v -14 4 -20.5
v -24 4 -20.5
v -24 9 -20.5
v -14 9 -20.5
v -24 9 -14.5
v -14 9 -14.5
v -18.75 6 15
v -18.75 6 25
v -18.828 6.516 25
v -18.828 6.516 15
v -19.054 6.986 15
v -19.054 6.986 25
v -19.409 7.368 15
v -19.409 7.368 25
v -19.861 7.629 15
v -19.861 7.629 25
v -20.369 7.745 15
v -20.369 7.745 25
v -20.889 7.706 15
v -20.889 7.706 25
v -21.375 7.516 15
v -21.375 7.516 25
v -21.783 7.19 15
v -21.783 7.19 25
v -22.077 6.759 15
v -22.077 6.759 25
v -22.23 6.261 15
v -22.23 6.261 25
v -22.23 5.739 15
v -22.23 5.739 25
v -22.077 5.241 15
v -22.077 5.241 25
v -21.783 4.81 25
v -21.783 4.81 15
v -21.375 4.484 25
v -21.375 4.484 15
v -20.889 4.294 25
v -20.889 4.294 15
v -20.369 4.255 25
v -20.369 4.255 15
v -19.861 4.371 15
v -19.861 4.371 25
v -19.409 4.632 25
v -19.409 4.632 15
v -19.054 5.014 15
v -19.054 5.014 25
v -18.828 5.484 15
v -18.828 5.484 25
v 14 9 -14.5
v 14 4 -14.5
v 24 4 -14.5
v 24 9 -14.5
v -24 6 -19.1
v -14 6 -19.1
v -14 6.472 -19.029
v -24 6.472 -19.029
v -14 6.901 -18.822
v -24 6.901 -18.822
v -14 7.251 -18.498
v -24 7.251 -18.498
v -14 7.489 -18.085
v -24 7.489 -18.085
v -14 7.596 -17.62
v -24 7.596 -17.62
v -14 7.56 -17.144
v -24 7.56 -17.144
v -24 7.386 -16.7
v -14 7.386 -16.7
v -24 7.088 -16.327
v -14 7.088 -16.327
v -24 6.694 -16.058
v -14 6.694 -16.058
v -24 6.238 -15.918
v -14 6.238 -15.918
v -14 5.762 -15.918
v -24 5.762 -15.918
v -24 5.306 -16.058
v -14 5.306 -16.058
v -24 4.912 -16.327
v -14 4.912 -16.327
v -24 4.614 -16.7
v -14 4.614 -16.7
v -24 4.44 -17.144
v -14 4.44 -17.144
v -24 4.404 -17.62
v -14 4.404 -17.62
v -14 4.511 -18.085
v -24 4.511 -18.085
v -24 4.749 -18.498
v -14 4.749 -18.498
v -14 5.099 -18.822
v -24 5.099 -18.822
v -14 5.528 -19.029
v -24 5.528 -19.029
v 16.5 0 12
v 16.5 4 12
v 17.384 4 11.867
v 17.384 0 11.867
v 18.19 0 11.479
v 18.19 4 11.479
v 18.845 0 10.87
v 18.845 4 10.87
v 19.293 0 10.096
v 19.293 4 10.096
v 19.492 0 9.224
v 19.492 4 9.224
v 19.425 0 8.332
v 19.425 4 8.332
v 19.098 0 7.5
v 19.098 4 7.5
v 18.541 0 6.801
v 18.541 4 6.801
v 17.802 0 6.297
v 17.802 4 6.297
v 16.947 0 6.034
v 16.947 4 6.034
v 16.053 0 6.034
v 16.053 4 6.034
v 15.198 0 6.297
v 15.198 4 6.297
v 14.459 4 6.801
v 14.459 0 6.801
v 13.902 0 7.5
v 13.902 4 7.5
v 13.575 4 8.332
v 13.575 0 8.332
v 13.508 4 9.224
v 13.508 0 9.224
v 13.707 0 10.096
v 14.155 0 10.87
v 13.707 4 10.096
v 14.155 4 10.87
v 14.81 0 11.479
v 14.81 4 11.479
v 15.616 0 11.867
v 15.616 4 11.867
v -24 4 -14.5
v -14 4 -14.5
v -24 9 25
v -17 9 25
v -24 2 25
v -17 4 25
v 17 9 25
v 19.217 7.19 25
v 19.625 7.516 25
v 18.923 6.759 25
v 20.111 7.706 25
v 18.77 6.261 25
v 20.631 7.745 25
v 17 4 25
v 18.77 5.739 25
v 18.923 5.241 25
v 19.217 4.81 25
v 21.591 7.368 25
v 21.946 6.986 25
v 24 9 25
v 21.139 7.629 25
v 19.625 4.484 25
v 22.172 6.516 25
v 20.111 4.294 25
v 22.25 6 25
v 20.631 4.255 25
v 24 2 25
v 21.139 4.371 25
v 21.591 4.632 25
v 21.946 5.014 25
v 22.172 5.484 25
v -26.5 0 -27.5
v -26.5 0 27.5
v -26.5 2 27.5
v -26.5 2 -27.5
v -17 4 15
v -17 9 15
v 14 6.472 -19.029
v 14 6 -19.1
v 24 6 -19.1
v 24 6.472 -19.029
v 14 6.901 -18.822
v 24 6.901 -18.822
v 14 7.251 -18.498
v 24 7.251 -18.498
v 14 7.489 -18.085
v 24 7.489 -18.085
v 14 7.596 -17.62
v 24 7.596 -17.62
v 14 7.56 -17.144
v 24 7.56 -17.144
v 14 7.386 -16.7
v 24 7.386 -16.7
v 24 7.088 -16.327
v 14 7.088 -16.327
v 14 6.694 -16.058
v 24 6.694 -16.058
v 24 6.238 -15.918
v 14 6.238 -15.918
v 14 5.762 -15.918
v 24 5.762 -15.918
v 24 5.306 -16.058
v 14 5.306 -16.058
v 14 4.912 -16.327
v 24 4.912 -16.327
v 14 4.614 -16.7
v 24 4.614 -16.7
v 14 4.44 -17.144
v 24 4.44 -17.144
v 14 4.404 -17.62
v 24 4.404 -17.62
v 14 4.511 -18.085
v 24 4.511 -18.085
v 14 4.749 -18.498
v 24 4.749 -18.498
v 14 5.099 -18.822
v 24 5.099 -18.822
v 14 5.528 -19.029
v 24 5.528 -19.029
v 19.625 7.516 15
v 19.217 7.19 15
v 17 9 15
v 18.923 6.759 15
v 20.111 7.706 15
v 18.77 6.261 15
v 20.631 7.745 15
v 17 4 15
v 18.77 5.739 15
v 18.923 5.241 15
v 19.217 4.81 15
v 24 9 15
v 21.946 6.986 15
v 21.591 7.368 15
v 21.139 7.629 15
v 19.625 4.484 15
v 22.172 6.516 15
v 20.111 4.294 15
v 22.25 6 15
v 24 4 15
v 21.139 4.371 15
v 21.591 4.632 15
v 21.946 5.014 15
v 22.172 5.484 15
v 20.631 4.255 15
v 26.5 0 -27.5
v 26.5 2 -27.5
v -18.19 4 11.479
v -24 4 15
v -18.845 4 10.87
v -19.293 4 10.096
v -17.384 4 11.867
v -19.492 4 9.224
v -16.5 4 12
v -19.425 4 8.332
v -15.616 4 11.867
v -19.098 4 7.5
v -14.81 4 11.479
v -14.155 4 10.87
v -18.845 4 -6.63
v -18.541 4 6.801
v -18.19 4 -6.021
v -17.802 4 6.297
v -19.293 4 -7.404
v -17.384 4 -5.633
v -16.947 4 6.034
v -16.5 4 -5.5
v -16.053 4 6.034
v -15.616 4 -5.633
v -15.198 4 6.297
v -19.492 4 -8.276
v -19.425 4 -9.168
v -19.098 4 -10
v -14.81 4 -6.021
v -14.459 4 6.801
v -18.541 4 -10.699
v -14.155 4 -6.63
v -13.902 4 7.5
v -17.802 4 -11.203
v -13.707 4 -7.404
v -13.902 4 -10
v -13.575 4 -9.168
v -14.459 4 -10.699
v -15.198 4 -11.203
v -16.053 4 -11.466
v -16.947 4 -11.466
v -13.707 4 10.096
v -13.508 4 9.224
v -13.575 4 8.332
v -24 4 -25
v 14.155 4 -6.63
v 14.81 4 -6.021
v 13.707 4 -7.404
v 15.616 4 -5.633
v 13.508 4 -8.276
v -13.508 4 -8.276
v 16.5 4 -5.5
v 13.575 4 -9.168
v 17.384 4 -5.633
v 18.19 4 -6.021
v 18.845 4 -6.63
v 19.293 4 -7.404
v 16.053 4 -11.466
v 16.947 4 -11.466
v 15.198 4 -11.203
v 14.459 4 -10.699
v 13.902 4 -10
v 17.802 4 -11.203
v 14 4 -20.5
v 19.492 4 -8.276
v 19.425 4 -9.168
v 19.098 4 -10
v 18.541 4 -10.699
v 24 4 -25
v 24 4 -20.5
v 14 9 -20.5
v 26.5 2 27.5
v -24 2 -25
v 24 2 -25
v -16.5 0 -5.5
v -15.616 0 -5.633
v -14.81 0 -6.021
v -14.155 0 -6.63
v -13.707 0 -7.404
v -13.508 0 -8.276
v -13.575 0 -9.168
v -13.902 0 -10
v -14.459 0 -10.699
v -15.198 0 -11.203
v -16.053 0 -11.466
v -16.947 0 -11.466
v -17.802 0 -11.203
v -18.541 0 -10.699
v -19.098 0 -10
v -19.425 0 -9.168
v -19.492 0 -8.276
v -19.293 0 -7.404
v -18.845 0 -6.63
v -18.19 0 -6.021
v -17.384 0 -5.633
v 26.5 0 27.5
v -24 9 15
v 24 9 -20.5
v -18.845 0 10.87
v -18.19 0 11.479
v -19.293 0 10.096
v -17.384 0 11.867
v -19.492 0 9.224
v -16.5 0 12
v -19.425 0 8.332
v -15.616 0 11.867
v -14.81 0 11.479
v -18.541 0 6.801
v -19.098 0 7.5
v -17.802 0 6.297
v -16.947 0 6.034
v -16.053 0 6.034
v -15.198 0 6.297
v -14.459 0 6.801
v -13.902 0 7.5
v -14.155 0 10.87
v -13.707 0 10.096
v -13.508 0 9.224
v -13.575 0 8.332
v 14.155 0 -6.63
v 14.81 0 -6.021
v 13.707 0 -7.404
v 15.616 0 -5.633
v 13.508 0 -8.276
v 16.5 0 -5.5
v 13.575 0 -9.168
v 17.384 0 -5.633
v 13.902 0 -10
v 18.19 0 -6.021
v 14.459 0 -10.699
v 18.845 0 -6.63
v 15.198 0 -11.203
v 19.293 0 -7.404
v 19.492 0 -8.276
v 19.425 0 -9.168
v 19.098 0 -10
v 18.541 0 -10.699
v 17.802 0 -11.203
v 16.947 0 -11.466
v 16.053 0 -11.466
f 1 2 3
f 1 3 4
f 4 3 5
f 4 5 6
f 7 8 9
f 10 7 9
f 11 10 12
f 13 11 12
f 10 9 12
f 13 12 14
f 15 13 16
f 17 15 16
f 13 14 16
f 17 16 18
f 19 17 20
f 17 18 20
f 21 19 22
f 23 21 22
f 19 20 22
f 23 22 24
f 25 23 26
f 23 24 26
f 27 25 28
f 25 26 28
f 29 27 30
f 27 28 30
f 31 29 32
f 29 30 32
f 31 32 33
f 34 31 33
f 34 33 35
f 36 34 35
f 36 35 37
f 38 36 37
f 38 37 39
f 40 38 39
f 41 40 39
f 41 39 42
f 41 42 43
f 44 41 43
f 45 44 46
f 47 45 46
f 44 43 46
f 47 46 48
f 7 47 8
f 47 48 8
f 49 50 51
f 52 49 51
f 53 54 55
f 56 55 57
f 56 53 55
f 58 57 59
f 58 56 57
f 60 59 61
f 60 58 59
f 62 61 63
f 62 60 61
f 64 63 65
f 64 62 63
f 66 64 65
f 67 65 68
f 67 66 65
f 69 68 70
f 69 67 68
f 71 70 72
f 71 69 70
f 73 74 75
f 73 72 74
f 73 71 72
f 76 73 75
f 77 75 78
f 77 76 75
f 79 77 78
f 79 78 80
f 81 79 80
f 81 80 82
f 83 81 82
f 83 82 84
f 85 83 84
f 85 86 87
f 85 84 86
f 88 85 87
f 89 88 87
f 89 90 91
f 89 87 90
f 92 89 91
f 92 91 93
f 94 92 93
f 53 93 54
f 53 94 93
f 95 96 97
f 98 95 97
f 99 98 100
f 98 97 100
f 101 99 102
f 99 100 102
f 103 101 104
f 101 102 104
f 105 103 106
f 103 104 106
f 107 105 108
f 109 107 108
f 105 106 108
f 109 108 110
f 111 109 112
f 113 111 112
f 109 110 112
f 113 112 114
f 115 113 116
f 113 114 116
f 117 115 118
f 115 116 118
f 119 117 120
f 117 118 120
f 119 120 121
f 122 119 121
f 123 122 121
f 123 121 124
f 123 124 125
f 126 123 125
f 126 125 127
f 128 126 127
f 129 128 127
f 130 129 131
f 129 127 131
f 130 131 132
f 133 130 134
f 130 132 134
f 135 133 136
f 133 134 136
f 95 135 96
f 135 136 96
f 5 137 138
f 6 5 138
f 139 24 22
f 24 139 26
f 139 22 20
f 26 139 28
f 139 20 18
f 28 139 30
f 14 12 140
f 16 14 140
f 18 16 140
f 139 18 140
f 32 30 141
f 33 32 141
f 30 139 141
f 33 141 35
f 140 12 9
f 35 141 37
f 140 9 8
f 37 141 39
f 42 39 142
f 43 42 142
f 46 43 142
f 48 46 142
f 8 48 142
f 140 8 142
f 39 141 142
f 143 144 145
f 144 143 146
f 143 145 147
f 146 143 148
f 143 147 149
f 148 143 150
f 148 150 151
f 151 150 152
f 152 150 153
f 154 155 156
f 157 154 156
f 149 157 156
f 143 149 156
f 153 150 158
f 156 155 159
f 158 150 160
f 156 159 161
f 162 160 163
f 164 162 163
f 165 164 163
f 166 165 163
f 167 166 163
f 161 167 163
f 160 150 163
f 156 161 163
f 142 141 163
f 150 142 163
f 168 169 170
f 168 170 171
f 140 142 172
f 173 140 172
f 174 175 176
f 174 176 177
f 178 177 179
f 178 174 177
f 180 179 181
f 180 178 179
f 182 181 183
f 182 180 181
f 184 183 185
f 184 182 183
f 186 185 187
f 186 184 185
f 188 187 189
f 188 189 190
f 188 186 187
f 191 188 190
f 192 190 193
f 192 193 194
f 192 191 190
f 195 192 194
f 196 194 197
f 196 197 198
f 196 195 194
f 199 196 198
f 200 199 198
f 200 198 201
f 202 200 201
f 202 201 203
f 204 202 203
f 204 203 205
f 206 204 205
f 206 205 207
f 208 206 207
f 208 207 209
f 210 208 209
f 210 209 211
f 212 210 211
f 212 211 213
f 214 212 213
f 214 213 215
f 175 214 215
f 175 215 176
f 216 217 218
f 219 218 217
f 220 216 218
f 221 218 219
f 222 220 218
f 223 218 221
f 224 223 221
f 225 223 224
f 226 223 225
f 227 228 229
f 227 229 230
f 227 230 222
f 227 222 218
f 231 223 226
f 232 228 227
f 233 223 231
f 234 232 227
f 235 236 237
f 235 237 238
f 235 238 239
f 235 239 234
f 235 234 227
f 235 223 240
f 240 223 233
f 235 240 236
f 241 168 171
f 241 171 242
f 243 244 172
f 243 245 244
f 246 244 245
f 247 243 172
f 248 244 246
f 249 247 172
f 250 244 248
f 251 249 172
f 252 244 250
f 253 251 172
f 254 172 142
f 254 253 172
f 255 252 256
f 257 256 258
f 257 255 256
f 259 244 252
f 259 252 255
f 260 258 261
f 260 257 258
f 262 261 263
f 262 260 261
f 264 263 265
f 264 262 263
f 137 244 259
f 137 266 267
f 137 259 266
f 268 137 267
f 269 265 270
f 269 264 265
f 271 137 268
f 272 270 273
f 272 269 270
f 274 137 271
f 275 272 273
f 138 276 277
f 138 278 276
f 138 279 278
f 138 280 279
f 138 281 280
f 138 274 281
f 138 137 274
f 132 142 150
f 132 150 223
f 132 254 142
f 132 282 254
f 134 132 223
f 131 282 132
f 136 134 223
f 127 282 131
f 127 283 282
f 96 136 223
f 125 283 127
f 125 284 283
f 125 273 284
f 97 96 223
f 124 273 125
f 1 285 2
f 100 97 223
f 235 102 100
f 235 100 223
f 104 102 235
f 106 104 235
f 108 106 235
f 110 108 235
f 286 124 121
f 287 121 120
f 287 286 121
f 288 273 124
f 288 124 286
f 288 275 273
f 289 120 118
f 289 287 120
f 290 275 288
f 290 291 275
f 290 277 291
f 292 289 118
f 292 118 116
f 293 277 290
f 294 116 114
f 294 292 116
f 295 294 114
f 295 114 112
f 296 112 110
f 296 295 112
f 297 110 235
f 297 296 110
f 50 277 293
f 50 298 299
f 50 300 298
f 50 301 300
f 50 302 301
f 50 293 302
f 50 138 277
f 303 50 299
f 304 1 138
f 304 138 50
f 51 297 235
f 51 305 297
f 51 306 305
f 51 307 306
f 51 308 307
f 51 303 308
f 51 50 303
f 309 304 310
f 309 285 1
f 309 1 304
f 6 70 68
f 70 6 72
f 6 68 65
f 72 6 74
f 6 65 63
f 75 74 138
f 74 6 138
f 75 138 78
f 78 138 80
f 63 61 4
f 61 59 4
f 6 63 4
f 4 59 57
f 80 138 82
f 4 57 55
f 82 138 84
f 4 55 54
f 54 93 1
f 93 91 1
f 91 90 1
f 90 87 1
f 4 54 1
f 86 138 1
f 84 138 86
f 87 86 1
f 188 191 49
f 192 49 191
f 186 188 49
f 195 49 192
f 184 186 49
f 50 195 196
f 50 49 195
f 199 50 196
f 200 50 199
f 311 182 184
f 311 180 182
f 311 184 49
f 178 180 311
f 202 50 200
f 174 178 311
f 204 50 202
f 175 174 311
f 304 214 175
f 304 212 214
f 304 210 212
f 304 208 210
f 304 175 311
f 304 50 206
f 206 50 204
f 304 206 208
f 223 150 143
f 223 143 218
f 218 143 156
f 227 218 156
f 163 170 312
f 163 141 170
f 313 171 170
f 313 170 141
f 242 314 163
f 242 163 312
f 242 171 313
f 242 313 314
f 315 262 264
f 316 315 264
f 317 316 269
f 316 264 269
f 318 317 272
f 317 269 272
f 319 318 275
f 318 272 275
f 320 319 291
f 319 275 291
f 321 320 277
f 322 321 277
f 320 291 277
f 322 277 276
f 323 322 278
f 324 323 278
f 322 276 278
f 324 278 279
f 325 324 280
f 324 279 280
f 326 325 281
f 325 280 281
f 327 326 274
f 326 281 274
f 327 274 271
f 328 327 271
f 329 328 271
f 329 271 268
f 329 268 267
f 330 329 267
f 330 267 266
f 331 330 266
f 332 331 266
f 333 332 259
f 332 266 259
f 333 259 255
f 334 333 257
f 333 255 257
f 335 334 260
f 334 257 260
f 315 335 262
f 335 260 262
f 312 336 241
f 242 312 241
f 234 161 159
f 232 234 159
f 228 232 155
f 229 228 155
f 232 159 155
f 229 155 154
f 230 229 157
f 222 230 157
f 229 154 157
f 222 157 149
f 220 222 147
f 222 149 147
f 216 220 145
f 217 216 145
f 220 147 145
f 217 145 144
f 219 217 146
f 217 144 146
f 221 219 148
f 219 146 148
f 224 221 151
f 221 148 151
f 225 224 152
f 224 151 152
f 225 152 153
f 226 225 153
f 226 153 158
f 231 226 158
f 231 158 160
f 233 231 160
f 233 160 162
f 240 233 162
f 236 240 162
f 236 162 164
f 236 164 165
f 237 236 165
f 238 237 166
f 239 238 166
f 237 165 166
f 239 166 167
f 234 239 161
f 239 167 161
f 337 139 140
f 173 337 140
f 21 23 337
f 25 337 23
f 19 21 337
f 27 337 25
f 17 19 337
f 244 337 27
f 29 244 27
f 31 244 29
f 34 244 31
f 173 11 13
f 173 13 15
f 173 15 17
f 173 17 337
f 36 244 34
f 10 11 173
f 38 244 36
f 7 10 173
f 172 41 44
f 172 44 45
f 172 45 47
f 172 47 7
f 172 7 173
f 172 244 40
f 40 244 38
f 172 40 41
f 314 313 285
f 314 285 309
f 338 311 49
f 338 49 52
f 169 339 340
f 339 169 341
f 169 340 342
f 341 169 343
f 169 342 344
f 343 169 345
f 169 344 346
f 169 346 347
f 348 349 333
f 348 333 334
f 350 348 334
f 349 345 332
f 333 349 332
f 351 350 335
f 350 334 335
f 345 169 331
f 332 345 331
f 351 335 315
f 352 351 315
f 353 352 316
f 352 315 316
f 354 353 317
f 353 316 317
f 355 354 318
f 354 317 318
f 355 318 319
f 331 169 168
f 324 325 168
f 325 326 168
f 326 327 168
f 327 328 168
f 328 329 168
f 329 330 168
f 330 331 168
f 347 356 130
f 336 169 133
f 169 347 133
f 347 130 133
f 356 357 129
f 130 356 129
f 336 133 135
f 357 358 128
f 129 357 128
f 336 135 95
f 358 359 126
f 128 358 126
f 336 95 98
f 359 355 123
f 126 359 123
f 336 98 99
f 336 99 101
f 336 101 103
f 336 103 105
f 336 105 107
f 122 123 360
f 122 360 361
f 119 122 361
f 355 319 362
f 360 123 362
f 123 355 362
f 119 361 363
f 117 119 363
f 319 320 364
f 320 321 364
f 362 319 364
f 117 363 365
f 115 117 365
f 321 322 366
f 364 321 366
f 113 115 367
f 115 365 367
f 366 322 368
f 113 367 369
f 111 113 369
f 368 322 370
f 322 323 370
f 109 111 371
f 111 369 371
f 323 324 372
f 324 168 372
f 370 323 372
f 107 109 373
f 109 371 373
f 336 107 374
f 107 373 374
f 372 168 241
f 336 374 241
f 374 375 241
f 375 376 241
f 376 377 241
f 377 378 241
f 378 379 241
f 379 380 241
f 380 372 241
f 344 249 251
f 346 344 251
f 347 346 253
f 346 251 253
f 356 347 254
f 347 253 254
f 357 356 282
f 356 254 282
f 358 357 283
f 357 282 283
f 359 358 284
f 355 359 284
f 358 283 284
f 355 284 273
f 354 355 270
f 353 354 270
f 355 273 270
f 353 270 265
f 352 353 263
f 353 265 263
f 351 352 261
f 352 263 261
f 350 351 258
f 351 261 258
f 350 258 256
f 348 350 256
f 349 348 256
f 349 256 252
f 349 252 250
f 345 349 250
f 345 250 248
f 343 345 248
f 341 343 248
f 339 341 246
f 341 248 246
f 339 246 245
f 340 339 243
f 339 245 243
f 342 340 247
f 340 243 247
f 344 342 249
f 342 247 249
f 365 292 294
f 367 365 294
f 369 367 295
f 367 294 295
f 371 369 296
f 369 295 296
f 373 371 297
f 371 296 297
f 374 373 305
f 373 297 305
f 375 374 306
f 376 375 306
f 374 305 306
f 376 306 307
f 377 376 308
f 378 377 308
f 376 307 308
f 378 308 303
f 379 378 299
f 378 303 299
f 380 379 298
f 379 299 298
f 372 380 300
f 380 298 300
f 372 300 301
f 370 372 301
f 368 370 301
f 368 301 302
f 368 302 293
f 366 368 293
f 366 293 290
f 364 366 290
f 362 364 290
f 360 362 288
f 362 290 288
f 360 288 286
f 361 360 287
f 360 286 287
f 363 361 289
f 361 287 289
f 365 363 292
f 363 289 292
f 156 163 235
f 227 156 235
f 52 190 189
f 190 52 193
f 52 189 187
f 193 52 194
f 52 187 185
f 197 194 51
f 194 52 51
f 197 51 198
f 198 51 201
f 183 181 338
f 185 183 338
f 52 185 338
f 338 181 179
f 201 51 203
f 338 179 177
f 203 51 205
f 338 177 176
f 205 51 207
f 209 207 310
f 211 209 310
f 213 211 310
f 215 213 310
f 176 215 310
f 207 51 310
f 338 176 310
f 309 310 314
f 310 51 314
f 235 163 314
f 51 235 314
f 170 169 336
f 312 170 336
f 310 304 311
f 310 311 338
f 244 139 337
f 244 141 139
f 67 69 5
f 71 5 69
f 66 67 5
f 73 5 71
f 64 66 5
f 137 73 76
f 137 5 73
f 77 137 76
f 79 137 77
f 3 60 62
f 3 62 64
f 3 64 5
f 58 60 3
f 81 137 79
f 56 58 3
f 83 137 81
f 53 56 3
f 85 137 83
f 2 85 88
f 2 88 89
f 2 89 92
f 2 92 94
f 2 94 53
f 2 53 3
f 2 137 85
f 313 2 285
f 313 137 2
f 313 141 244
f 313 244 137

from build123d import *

# Parameters (mm, degrees)
SKETCH1_W               = 53
SKETCH1_H               = 55
TOP_DEPTH               = 2
SKETCH2_W               = 48
SKETCH2_H               = 50
INSIDE_LIP_DEPTH        = 2
SKETCH3_W               = 7
SKETCH3_H               = 10
SKETCH3_W_2             = 10
SKETCH3_H_2             = 6
SCREW_POSTS_DEPTH       = 5
SKETCH4_R               = 1.75
FRONT_SCREW_HOLES_DEPTH = 10
BACK_START              = -48
SKETCH5_R               = 1.6
BACK_SCREW_HOLES_DEPTH  = 48
SKETCH6_R               = 3
CUT_EXTRUDE3_DEPTH      = 4


with BuildPart() as part:
    # Sketch1 → Top (new body)
    with BuildSketch(Plane(origin=(0, 0, 0), x_dir=(1, 0, 0), z_dir=(0, 1, 0))):
        Rectangle(SKETCH1_W, SKETCH1_H)
    extrude(amount=TOP_DEPTH)

    # Sketch2 → Inside Lip (add)
    with BuildSketch(Plane(origin=(0, 2, 0), x_dir=(1, 0, 0), z_dir=(0, 1, 0))):
        Rectangle(SKETCH2_W, SKETCH2_H)
    extrude(amount=INSIDE_LIP_DEPTH)

    # Sketch3 → Screw Posts (add)
    with BuildSketch(Plane(origin=(0, 4, 0), x_dir=(1, 0, 0), z_dir=(0, 1, 0))):
        with Locations((-20.5, -20)):
            Rectangle(SKETCH3_W, SKETCH3_H)
        with Locations((20.5, -20)):
            Rectangle(SKETCH3_W, SKETCH3_H)
        with Locations((19, 17.5)):
            Rectangle(SKETCH3_W_2, SKETCH3_H_2)
        with Locations((-19, 17.5)):
            Rectangle(SKETCH3_W_2, SKETCH3_H_2)
    extrude(amount=SCREW_POSTS_DEPTH)

    # Sketch4 → Front Screw Holes (cut)
    with BuildSketch(Plane.XY.offset(25)):
        with Locations((-20.5, 6)):
            Circle(SKETCH4_R)
        with Locations((20.5, 6)):
            Circle(SKETCH4_R)
    extrude(amount=-FRONT_SCREW_HOLES_DEPTH, mode=Mode.SUBTRACT)

    # Sketch5 → Back Screw Holes (cut)
    with BuildSketch(Plane(origin=(24, 0, 0), x_dir=(0, 0, -1), z_dir=(1, 0, 0)).offset(BACK_START)):
        with Locations((17.5, 6)):
            Circle(SKETCH5_R)
    extrude(amount=BACK_SCREW_HOLES_DEPTH, mode=Mode.SUBTRACT)

    # Sketch6 → Cut-Extrude3 (cut)
    with BuildSketch(Plane(origin=(0, 4, 0), x_dir=(1, 0, 0), z_dir=(0, 1, 0))):
        with Locations(Location((-16.5, -9, 0), (0, 0, 270))):
            Circle(SKETCH6_R)
        with Locations(Location((-16.5, 8.5, 0), (0, 0, 270))):
            Circle(SKETCH6_R)
        with Locations(Location((16.5, -9, 0), (0, 0, 270))):
            Circle(SKETCH6_R)
        with Locations(Location((16.5, 8.5, 0), (0, 0, 270))):
            Circle(SKETCH6_R)
    extrude(amount=-CUT_EXTRUDE3_DEPTH, mode=Mode.SUBTRACT)


solid = part.part
